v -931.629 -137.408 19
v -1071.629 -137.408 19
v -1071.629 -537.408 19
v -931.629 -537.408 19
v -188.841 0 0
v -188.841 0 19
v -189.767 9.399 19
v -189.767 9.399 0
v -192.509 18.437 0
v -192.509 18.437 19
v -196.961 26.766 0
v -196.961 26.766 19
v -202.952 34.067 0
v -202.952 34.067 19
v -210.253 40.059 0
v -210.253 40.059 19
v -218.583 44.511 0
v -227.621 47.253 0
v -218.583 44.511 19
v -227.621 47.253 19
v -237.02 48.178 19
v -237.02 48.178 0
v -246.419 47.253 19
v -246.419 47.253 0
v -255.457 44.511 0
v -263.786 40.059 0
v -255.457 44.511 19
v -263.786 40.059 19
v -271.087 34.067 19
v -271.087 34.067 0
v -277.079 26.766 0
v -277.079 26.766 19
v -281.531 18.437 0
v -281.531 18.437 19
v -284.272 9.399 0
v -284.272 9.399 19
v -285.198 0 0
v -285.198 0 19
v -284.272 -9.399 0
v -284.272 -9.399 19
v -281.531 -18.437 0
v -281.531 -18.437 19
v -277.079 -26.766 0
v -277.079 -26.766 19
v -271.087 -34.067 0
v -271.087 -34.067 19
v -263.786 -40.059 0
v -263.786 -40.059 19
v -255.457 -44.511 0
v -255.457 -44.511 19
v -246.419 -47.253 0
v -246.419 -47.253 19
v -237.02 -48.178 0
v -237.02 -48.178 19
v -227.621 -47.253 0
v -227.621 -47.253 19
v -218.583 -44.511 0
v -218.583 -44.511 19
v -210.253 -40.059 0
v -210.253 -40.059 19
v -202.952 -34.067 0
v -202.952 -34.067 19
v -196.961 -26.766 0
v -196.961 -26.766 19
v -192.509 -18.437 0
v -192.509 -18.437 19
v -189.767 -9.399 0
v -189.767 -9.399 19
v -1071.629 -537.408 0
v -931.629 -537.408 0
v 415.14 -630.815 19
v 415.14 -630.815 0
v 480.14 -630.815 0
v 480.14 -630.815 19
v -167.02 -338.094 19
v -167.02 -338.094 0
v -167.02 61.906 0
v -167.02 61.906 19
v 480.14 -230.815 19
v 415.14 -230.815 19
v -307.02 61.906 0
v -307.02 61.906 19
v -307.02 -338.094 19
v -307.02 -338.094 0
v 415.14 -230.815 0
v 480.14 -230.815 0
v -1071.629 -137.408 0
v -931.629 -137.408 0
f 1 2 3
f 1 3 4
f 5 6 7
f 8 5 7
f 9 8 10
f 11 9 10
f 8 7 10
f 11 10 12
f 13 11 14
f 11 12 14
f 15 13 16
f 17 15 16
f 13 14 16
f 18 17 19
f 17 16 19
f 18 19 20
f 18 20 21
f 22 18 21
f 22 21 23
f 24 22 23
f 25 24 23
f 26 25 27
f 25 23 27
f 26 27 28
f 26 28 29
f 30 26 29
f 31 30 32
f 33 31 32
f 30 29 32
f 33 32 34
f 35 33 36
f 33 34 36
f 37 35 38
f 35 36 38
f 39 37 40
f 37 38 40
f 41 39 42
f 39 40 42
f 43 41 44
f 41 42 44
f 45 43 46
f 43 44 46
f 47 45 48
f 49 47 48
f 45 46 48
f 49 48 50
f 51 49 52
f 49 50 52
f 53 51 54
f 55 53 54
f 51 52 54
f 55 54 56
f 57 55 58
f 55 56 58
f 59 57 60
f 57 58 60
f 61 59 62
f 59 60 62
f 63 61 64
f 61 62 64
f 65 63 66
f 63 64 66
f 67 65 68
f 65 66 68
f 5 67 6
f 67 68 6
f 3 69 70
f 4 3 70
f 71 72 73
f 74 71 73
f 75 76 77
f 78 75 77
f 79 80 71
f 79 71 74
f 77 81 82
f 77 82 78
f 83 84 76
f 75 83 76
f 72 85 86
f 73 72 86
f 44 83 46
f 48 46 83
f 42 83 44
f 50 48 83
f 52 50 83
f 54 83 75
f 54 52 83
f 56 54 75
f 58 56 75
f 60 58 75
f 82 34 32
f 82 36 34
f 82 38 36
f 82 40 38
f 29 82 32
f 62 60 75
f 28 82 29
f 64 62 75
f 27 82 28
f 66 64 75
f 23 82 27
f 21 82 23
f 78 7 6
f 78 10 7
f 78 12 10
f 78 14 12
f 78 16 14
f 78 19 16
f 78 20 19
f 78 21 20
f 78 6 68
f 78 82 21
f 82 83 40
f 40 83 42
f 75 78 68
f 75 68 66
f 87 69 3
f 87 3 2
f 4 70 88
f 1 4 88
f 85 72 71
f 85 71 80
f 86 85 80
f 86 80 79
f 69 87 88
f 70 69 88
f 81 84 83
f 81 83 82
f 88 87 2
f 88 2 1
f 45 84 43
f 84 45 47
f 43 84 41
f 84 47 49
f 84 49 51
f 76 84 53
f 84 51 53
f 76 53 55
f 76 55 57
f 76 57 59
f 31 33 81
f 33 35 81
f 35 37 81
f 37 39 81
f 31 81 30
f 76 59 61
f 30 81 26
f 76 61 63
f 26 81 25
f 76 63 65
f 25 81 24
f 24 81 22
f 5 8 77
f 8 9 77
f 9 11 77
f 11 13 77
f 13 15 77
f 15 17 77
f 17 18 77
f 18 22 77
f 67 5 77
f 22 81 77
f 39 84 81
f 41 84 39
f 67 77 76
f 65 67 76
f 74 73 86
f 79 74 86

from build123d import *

# Parameters (mm, degrees)
F1_W     = 140
F1_H     = 400
F2_DEPTH = 19
F0_W     = 140
F0_H     = 400
F3_DEPTH = 19
F4_W     = 65
F4_H     = 400
F5_DEPTH = 19
F6_R     = 48.178396
F7_DEPTH = 19


with BuildPart() as f2:
    # F1 (on Top) → F2 (new body)
    with BuildSketch(Plane.XY):
        with Locations((-1001.62869, -337.407696)):
            Rectangle(F1_W, F1_H)
    extrude(amount=F2_DEPTH)


with BuildPart() as f3:
    # F0 (on Top) → F3 (new body)
    with BuildSketch(Plane.XY):
        with Locations((-237.019693, -138.093679)):
            Rectangle(F0_W, F0_H)
    extrude(amount=F3_DEPTH)

    # F6 (on face) → F7 (cut)
    with BuildSketch(Plane.XY.offset(19)):
        with Locations((-237.019693, 0)):
            Circle(F6_R)
    extrude(amount=-F7_DEPTH, mode=Mode.SUBTRACT)


with BuildPart() as f5:
    # F4 (on Top) → F5 (new body)
    with BuildSketch(Plane.XY):
        with Locations((447.639887, -430.814659)):
            Rectangle(F4_W, F4_H)
    extrude(amount=F5_DEPTH)


solid = Compound([f2.part, f3.part, f5.part])
